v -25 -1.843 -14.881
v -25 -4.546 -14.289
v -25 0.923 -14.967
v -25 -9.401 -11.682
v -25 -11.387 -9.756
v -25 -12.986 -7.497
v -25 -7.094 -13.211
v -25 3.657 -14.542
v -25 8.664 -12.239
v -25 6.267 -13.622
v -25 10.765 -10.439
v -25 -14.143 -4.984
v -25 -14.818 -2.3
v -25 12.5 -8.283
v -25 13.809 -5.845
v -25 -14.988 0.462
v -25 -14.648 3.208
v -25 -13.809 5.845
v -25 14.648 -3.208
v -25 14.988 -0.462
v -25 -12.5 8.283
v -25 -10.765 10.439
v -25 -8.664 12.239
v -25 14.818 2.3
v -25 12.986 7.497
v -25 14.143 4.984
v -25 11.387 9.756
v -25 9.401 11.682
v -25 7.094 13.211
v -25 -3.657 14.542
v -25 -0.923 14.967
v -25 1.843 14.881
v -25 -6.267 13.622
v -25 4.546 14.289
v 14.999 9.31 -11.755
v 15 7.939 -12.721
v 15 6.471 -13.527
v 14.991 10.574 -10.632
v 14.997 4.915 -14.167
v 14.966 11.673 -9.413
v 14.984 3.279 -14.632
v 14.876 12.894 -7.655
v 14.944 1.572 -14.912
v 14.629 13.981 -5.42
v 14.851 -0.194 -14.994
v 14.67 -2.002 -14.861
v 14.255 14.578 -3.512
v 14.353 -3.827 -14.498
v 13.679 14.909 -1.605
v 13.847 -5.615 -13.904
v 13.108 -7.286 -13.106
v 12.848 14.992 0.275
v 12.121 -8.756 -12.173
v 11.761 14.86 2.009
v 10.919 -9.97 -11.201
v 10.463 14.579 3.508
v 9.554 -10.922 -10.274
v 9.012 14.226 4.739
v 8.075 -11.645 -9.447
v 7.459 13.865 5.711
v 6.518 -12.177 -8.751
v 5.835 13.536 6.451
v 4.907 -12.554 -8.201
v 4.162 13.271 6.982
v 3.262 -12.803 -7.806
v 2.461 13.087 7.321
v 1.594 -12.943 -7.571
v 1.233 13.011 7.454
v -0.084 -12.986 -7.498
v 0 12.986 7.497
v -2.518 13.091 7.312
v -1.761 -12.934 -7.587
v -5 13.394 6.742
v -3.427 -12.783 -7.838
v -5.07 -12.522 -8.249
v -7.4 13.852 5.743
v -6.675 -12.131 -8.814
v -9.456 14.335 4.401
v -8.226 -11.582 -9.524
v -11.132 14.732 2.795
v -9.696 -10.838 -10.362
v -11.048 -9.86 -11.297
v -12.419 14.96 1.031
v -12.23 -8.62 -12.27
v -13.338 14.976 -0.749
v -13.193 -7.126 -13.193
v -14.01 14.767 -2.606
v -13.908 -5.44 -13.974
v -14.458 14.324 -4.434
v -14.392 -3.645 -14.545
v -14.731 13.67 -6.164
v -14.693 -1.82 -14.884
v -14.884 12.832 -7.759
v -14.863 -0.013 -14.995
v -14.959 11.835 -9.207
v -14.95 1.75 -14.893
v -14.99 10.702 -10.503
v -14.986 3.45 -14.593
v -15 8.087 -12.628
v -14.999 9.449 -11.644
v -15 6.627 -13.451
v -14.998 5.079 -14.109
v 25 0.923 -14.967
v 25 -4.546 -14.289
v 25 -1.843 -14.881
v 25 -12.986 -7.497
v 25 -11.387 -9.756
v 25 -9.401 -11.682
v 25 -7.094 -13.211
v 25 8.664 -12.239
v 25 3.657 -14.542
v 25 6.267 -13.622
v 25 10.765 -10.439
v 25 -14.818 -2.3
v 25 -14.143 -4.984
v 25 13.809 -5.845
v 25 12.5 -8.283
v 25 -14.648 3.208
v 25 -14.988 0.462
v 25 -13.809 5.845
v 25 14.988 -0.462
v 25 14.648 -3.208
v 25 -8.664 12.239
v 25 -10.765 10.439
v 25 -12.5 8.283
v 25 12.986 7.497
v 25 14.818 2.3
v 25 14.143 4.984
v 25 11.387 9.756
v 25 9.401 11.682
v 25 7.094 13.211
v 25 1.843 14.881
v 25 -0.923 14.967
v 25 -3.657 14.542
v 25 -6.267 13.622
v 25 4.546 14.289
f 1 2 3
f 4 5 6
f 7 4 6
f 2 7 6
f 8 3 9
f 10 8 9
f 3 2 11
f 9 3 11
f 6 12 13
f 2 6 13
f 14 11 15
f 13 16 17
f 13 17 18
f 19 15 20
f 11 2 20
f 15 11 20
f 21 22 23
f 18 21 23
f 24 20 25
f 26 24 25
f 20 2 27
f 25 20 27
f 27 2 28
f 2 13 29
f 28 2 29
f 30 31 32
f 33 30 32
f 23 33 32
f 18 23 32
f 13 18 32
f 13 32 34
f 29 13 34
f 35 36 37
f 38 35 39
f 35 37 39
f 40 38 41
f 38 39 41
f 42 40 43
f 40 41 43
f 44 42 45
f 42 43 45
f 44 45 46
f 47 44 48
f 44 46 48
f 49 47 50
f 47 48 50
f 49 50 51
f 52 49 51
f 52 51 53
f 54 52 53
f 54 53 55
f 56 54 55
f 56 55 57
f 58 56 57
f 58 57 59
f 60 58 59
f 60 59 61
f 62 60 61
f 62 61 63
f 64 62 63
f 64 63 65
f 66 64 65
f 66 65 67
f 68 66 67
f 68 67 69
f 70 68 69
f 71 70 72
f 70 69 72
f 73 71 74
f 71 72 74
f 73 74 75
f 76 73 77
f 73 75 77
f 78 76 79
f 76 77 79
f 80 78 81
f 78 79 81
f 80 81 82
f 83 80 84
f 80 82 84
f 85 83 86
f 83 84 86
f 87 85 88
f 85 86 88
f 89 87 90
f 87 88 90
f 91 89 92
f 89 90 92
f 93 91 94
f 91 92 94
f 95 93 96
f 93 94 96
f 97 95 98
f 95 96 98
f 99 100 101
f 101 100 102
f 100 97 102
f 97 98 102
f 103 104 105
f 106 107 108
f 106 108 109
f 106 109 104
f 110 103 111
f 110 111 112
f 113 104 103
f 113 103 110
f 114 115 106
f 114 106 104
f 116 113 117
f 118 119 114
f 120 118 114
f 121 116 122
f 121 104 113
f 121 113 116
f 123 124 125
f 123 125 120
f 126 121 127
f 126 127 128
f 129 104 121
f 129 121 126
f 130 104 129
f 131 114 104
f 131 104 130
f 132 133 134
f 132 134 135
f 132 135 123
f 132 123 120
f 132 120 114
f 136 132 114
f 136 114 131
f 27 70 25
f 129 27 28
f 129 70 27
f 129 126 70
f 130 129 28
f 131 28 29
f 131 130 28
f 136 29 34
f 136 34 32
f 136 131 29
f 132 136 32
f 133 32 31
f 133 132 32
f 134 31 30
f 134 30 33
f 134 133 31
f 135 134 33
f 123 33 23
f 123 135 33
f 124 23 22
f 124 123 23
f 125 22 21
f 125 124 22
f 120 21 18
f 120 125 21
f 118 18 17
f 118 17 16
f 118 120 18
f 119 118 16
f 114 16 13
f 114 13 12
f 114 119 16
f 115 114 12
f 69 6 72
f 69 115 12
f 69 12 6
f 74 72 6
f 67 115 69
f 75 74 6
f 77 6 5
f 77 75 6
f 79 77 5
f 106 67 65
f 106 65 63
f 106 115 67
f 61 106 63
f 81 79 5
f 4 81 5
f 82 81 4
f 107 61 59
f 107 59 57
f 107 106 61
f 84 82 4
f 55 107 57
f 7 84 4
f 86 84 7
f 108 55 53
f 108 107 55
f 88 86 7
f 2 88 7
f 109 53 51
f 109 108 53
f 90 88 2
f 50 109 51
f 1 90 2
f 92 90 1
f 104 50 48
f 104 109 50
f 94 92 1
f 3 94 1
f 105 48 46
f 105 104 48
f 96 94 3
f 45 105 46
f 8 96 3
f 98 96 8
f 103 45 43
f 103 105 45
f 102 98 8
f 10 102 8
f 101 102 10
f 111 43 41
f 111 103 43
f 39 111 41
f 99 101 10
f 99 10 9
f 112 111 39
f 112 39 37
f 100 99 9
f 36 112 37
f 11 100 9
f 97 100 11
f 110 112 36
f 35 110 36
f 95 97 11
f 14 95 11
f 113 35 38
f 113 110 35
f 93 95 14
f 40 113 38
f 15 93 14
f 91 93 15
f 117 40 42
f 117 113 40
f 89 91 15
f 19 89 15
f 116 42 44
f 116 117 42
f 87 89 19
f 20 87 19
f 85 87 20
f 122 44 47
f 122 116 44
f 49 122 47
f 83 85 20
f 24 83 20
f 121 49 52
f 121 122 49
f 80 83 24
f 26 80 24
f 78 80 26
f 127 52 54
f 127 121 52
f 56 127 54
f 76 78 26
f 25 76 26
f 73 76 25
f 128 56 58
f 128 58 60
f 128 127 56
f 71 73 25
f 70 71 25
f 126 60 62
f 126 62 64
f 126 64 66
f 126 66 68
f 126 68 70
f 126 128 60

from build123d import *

# Parameters (mm, degrees)
F0_R          = 14.995
F1_DEPTH      = 25
F1_DEPTH_BACK = 25
F2_R          = 15
F3_DEPTH      = 25
F3_DEPTH_BACK = 25
F5_ANGLE      = 30


with BuildPart() as f1:
    # F0 (on Right) → F1 (new body, two sides)
    with BuildSketch(Plane.YZ) as f1_sk:
        Circle(F0_R)
    extrude(amount=F1_DEPTH)
    extrude(f1_sk.sketch, amount=-F1_DEPTH_BACK)

    # F2 (on Front) → F3 (cut, two sides)
    with BuildSketch(Plane.XZ) as f3_sk:
        with Locations((0, -15)):
            Circle(F2_R)
    extrude(amount=-F3_DEPTH, mode=Mode.SUBTRACT)
    extrude(f3_sk.sketch, amount=F3_DEPTH_BACK, mode=Mode.SUBTRACT)


with BuildPart() as f1_1:
    # F5: moved
    add(f1.part.rotate(Axis((31.3068032265, 0, 0), (1, 0, 0)), F5_ANGLE))


solid = f1_1.part
